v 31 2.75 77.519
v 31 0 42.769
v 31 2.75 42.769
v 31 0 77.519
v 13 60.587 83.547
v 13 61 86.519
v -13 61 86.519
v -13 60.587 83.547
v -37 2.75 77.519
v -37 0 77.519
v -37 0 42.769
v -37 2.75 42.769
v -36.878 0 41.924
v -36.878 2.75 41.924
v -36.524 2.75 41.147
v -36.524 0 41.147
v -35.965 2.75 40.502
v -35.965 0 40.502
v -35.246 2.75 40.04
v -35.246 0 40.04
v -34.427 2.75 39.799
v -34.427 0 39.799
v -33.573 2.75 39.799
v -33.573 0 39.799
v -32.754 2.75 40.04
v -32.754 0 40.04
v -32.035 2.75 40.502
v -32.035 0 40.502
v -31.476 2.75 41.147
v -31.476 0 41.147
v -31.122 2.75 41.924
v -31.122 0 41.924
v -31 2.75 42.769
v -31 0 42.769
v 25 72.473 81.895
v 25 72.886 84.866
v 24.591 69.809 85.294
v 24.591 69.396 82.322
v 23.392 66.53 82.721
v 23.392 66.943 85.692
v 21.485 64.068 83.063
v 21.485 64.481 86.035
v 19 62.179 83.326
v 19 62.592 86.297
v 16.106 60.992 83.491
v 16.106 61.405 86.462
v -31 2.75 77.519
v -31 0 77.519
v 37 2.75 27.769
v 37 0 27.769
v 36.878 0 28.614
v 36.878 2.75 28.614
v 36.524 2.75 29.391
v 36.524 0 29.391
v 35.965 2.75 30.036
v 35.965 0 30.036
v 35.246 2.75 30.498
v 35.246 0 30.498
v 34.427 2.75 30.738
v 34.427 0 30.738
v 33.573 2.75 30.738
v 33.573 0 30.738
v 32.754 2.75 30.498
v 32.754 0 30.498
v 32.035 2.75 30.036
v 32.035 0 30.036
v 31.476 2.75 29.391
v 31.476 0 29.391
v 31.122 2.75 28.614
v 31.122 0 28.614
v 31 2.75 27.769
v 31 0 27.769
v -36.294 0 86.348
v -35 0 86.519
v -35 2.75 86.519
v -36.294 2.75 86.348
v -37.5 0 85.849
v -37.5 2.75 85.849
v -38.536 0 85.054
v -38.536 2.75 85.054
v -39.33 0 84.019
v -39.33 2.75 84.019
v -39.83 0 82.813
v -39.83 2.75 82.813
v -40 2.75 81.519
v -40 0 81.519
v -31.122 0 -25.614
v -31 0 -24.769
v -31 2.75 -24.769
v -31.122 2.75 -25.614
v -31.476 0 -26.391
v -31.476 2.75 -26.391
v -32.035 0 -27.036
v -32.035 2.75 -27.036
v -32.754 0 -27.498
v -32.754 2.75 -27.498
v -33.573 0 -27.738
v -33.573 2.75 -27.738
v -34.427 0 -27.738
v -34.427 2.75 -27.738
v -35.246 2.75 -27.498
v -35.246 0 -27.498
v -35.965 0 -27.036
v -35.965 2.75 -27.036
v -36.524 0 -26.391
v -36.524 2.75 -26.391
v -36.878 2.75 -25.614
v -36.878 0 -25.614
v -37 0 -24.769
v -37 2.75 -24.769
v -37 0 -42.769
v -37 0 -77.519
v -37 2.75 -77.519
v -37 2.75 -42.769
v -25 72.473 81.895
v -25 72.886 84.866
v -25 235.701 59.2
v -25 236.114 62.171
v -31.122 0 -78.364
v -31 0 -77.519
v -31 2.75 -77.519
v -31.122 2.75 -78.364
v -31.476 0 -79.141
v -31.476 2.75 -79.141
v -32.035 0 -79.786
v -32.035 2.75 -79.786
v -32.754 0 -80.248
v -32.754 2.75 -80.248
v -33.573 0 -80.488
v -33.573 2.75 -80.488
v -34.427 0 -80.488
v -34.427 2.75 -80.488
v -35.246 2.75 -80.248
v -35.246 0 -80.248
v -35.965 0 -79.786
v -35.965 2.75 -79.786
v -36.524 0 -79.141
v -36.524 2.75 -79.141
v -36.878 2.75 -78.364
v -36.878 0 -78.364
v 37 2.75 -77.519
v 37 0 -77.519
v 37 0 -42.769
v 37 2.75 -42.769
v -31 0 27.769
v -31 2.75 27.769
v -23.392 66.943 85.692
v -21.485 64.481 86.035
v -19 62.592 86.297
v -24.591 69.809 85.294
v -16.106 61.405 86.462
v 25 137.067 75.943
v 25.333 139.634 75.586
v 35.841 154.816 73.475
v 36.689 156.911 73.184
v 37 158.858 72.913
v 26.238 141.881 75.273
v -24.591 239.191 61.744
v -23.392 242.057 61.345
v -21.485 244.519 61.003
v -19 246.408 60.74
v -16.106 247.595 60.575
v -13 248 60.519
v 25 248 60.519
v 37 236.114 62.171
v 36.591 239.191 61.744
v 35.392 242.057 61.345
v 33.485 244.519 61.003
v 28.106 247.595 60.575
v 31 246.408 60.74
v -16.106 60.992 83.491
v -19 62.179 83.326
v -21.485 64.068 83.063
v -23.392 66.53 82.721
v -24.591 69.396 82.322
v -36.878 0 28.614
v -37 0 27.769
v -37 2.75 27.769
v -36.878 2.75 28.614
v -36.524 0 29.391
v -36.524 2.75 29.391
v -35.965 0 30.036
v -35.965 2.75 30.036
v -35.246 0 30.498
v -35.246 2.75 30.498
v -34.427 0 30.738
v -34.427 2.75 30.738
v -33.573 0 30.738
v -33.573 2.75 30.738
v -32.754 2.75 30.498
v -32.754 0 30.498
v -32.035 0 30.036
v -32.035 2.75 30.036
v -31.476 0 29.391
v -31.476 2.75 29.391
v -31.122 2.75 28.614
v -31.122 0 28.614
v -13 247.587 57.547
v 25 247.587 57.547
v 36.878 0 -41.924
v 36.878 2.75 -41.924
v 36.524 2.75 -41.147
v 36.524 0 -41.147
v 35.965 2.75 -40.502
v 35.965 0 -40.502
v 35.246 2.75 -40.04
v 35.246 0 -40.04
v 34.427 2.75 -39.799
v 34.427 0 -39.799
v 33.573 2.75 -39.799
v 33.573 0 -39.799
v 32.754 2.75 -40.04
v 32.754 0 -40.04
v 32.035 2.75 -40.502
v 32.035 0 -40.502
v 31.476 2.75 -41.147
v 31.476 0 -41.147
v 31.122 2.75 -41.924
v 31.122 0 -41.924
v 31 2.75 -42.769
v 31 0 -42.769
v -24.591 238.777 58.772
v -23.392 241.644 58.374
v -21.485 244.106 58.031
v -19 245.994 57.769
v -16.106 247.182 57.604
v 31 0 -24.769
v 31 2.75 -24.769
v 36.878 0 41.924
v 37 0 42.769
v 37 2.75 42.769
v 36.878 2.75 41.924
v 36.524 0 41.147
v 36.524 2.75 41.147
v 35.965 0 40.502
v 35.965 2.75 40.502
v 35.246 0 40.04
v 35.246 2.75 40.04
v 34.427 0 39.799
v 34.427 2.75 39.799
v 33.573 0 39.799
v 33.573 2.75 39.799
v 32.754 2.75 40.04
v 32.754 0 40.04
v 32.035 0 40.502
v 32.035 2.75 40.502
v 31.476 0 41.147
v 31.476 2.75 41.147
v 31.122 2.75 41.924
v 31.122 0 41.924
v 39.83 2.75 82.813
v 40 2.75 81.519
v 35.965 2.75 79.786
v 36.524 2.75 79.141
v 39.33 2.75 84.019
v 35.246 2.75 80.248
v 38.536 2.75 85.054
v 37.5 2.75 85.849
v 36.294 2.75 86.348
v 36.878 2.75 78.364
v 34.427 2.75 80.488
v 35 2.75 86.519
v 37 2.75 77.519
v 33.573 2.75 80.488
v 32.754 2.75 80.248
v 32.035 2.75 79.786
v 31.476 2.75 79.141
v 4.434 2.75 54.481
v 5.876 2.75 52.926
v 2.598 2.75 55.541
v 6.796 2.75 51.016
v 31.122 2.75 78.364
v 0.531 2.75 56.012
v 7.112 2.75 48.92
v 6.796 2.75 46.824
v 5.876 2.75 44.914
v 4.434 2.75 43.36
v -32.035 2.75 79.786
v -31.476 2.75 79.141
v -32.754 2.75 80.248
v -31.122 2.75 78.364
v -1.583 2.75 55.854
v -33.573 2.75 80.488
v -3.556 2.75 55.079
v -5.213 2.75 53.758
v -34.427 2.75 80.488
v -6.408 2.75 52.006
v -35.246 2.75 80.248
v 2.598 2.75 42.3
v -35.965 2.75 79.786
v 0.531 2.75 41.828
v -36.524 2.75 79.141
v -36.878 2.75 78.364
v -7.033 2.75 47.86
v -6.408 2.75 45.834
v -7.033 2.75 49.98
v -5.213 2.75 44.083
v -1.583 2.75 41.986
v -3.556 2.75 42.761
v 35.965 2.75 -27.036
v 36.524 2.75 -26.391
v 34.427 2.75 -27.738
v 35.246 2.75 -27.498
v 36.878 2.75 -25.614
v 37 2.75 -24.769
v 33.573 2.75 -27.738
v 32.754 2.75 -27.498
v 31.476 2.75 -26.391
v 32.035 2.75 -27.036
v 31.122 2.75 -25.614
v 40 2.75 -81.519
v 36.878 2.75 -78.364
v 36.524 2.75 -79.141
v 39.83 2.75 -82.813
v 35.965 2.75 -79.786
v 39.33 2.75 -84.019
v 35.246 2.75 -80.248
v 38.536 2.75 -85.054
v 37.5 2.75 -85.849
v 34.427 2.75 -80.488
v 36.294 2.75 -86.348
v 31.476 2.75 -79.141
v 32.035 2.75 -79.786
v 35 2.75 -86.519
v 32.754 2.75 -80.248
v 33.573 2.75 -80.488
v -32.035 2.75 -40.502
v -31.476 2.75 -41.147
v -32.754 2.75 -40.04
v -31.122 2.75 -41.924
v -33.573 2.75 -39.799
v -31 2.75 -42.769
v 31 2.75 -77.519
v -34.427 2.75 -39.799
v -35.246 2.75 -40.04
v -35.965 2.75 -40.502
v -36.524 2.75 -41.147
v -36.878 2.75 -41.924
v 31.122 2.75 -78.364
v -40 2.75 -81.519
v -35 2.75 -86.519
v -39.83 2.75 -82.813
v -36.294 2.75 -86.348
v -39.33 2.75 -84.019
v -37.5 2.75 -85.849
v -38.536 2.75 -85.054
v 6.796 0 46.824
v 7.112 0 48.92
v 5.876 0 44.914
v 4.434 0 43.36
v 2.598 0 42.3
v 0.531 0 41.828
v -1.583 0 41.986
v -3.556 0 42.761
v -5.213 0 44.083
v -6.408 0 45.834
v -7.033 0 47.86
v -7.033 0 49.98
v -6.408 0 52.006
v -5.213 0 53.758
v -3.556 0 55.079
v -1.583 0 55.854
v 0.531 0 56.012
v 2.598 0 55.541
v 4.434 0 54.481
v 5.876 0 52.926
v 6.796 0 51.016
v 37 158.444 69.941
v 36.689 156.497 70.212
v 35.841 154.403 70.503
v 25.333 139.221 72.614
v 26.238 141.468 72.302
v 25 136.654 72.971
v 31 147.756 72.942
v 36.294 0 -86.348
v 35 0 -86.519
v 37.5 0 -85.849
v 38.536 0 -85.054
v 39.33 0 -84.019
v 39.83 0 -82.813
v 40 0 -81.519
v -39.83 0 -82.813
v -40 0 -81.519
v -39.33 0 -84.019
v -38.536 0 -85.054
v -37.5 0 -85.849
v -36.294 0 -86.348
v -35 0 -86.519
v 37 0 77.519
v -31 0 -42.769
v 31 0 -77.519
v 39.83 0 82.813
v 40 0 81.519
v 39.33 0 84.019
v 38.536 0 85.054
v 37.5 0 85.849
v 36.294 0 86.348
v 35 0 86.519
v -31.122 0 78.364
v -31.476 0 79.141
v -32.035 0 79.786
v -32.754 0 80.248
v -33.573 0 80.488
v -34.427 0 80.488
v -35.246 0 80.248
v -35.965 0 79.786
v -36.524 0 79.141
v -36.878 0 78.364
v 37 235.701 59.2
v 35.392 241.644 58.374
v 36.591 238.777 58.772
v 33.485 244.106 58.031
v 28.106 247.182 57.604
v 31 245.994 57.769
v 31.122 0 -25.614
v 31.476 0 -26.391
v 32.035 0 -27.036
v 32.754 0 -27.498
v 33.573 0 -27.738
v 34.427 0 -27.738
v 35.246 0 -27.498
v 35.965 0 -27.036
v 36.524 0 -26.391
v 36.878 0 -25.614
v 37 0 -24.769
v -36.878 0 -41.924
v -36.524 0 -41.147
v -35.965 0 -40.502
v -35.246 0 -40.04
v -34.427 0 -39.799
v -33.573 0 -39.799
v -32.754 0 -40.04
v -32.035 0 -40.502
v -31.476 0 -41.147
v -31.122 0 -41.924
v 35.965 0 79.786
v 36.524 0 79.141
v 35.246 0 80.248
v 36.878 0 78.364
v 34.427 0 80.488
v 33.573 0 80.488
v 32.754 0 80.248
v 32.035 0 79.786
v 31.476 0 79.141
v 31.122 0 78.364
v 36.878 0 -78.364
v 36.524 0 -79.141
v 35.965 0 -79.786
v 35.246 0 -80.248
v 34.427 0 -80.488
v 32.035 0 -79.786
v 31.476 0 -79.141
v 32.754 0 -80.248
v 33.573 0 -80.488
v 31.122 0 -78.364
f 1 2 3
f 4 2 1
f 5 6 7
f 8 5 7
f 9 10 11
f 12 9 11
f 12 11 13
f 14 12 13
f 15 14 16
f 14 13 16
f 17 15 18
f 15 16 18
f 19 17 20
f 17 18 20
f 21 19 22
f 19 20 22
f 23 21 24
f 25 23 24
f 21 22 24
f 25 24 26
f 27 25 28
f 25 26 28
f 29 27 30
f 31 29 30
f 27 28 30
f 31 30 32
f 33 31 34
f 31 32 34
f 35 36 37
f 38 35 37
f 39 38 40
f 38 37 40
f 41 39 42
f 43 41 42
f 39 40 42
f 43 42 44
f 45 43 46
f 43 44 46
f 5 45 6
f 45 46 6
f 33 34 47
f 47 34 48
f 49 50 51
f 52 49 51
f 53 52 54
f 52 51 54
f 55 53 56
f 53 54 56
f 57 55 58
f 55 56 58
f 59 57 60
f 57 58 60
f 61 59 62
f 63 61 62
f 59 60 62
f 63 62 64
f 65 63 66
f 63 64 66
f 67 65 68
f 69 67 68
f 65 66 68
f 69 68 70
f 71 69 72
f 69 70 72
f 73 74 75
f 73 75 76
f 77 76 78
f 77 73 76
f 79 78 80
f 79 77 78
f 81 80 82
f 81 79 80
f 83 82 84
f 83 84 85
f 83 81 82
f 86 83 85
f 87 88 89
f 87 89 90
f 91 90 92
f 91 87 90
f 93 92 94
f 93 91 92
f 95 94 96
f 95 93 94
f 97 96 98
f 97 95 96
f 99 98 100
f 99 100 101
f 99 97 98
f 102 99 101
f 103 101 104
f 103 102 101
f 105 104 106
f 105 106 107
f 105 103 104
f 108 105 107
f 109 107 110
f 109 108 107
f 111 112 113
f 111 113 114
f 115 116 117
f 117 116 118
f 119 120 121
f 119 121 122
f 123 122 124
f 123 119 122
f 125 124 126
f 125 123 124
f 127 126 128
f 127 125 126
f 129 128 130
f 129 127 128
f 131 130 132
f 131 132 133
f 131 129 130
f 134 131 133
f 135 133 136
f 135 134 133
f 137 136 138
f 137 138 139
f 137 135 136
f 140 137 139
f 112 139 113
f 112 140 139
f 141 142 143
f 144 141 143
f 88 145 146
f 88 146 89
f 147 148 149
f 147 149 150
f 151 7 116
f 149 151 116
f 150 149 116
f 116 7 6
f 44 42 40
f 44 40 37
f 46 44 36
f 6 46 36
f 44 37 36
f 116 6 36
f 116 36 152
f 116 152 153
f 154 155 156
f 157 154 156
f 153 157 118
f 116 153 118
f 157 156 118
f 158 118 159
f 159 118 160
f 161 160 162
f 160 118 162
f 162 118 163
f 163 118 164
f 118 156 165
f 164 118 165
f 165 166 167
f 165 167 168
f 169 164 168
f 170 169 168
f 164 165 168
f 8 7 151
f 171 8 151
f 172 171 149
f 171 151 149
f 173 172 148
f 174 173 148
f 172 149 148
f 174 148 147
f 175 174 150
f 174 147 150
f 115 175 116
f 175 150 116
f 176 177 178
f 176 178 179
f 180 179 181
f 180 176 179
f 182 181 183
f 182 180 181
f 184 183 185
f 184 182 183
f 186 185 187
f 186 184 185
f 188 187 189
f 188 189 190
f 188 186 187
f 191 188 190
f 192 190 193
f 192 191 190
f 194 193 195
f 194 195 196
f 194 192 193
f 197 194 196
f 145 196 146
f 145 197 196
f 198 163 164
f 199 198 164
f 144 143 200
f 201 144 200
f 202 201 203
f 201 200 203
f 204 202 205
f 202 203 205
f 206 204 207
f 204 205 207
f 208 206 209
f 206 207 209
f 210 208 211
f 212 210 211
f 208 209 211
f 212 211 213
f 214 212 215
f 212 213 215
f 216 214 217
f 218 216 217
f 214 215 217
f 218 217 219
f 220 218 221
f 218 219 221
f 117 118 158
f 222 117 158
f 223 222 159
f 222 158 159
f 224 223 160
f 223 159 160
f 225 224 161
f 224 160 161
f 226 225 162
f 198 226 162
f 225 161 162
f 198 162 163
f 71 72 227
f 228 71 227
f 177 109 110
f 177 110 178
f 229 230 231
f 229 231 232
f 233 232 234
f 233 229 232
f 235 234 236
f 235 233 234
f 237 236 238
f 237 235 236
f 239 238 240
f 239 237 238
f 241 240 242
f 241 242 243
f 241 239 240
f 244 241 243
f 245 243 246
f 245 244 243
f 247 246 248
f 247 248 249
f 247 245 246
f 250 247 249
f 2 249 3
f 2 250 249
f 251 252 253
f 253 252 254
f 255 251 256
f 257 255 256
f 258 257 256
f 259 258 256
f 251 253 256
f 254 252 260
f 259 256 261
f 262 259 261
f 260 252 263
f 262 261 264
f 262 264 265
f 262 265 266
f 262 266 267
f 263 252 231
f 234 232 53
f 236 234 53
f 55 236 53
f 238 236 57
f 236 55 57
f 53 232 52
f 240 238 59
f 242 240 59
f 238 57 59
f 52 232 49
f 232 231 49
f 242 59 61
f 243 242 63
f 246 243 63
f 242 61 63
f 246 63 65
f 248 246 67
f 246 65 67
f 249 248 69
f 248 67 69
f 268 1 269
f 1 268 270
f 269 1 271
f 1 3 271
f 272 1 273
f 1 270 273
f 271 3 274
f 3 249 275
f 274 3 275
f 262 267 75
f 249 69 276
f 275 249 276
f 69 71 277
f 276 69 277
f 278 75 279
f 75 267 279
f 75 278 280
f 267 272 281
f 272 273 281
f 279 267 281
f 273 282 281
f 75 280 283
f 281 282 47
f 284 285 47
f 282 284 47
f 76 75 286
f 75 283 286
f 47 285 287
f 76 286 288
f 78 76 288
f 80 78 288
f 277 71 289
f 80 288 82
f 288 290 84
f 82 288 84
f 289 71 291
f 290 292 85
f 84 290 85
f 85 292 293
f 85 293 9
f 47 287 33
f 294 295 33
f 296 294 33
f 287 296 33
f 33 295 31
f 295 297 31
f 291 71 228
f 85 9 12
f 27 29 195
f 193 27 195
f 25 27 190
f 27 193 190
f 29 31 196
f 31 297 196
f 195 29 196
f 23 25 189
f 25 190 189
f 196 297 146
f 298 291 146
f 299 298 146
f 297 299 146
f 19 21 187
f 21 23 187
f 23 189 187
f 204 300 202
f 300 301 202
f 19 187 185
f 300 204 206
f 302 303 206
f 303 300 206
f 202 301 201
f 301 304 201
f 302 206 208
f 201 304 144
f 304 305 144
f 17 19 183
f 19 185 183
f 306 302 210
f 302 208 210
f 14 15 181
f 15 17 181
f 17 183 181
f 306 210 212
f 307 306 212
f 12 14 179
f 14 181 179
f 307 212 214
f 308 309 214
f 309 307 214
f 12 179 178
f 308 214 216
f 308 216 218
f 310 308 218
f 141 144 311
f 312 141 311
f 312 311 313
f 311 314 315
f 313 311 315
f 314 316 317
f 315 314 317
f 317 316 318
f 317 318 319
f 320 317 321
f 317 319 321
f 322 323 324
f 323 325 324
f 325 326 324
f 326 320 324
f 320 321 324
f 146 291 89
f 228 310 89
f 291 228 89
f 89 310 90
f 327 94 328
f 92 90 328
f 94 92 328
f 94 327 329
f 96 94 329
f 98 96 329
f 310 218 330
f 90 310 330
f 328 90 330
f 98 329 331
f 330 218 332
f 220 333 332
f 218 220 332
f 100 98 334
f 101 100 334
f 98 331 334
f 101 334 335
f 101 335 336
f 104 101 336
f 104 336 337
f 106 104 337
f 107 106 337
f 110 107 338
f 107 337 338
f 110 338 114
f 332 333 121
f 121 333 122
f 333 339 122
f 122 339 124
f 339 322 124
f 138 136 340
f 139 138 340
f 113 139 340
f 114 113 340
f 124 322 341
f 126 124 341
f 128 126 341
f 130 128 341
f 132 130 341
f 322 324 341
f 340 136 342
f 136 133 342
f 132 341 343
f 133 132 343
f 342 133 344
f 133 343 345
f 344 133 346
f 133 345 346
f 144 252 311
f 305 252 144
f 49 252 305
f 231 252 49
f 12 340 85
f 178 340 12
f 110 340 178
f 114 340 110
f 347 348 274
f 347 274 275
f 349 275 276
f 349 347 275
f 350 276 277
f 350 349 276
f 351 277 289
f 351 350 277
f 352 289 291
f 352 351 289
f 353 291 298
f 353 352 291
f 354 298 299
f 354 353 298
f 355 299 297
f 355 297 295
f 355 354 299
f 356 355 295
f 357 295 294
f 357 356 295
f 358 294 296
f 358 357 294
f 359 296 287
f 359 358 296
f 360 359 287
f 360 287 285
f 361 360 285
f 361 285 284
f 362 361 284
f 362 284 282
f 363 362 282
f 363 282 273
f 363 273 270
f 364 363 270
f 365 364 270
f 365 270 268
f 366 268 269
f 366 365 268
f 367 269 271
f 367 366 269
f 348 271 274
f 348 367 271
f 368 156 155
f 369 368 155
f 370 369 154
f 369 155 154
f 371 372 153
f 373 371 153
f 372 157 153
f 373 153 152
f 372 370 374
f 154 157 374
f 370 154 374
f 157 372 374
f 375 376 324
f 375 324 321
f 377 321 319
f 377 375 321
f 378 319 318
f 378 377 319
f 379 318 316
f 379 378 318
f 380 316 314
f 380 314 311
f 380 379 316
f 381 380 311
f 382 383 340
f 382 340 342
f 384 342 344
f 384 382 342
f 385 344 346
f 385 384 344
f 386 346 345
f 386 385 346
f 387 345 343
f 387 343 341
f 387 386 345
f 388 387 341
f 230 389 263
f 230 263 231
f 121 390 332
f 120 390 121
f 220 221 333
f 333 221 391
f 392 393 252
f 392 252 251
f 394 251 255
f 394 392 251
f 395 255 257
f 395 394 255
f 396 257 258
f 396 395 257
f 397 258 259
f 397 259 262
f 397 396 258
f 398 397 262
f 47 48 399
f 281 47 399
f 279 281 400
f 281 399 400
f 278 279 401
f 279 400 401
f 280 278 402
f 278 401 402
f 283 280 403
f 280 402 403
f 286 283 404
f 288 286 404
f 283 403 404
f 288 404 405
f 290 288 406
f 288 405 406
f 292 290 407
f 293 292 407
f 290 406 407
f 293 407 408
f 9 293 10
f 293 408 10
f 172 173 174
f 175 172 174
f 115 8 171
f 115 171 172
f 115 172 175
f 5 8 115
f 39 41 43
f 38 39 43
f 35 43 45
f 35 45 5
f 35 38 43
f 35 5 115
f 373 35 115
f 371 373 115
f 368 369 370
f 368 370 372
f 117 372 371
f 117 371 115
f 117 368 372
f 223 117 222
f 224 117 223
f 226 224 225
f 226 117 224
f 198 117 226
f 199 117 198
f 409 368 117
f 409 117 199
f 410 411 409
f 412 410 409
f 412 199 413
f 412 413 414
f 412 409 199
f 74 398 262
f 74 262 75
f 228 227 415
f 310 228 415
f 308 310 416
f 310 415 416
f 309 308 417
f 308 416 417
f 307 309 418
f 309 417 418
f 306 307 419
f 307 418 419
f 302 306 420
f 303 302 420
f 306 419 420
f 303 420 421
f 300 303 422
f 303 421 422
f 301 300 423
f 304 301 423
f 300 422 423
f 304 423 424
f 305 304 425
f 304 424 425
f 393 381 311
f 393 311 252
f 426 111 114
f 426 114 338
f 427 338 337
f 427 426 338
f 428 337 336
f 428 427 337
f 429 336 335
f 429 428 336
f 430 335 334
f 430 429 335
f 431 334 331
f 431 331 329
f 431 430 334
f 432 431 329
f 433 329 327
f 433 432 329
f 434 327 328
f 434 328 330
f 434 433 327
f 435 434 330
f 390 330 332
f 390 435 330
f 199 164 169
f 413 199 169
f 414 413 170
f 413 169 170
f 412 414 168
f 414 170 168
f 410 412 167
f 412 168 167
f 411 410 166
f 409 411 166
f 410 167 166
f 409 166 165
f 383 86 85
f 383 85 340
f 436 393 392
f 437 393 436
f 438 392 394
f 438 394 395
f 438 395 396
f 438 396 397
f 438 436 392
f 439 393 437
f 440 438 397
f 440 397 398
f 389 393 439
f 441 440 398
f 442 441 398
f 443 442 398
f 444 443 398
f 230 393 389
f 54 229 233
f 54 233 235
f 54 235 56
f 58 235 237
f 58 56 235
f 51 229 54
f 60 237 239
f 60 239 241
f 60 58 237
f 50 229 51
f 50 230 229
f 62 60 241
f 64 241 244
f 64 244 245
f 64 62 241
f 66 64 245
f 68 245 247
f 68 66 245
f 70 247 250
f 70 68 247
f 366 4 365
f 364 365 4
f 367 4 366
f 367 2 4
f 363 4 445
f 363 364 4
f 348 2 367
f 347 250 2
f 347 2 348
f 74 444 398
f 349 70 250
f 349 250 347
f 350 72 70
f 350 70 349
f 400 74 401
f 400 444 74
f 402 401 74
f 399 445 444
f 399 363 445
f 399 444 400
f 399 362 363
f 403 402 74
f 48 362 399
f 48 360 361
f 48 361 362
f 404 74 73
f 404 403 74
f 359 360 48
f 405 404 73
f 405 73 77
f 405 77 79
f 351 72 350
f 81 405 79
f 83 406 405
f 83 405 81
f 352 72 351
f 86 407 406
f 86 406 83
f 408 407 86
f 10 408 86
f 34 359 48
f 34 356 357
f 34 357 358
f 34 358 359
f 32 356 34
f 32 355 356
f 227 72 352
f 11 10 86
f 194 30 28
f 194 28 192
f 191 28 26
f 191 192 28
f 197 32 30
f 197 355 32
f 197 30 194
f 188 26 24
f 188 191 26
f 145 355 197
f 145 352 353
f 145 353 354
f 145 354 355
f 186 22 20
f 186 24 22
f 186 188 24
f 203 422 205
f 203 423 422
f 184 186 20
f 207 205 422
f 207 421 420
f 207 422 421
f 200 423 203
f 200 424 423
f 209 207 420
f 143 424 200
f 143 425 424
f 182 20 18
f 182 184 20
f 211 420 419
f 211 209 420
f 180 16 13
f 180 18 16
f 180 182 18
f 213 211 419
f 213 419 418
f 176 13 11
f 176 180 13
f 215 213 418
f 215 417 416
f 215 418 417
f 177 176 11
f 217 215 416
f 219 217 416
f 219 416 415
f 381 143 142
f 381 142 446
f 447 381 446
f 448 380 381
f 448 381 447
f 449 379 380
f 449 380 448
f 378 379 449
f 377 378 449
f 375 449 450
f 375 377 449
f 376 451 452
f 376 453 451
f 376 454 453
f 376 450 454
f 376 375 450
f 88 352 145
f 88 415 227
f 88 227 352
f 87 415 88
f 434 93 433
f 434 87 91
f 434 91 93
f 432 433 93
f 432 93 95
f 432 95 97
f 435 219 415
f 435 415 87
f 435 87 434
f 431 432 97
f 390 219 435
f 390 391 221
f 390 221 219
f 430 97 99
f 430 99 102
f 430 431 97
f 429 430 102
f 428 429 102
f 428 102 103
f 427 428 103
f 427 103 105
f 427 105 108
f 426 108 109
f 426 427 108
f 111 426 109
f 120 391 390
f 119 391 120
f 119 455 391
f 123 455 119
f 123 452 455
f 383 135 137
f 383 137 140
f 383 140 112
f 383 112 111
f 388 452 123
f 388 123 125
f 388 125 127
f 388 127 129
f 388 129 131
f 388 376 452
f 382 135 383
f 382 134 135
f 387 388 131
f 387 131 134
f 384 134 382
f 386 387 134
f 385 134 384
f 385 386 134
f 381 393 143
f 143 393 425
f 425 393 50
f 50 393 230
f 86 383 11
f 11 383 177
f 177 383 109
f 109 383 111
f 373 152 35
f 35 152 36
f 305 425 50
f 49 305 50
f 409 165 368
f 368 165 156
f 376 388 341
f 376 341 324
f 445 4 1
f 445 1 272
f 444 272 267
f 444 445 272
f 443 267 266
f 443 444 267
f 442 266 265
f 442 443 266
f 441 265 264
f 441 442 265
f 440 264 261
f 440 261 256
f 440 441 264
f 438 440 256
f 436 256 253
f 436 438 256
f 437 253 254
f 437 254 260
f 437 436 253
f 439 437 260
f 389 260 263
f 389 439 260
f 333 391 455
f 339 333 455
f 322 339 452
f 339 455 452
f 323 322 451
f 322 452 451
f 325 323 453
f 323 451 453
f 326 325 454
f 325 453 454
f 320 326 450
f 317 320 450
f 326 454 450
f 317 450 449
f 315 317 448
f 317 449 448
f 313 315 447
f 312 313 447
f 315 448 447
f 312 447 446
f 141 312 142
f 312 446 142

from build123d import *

# Parameters (mm, degrees)
SKETCH1_R           = 7.112045721
BOSS_EXTRUDE1_DEPTH = 2.75
BOSS_EXTRUDE2_DEPTH = 3


with BuildPart() as part:
    # Sketch1 → Boss-Extrude1 (new body)
    with BuildSketch(Plane(origin=(0, 0, 0), x_dir=(1, 0, 0), z_dir=(0, 1, 0))):
        with BuildLine():
            Line((-35, 86.51875), (35, 86.51875))
            ThreePointArc((35, 86.51875), (38.535533906, 85.054283906), (40, 81.51875))
            Line((40, 81.51875), (40, -81.51875))
            ThreePointArc((40, -81.51875), (38.535533906, -85.054283906), (35, -86.51875))
            Line((35, -86.51875), (-35, -86.51875))
            ThreePointArc((-35, -86.51875), (-38.535533906, -85.054283906), (-40, -81.51875))
            Line((-40, -81.51875), (-40, 81.51875))
            ThreePointArc((-40, 81.51875), (-38.535533906, 85.054283906), (-35, 86.51875))
        make_face()
        with Locations((0, -48.920084539)):
            Circle(SKETCH1_R, mode=Mode.SUBTRACT)
        with BuildLine():
            Line((37, 77.51875), (37, 42.76875))
            ThreePointArc((37, 42.76875), (34, 39.76875), (31, 42.76875))
            Line((31, 42.76875), (31, 77.51875))
            ThreePointArc((31, 77.51875), (34, 80.51875), (37, 77.51875))
        make_face(mode=Mode.SUBTRACT)
        with BuildLine():
            Line((-37, 77.51875), (-37, 42.76875))
            ThreePointArc((-37, 42.76875), (-34, 39.76875), (-31, 42.76875))
            Line((-31, 42.76875), (-31, 77.51875))
            ThreePointArc((-31, 77.51875), (-34, 80.51875), (-37, 77.51875))
        make_face(mode=Mode.SUBTRACT)
        with BuildLine():
            Line((37, -77.51875), (37, -42.76875))
            ThreePointArc((37, -42.76875), (34, -39.76875), (31, -42.76875))
            Line((31, -42.76875), (31, -77.51875))
            ThreePointArc((31, -77.51875), (34, -80.51875), (37, -77.51875))
        make_face(mode=Mode.SUBTRACT)
        with BuildLine():
            Line((-37, -77.51875), (-37, -42.76875))
            ThreePointArc((-37, -42.76875), (-34, -39.76875), (-31, -42.76875))
            Line((-31, -42.76875), (-31, -77.51875))
            ThreePointArc((-31, -77.51875), (-34, -80.51875), (-37, -77.51875))
        make_face(mode=Mode.SUBTRACT)
        with BuildLine():
            Line((37, 24.76875), (37, -27.76875))
            ThreePointArc((37, -27.76875), (34, -30.76875), (31, -27.76875))
            Line((31, -27.76875), (31, 24.76875))
            ThreePointArc((31, 24.76875), (34, 27.76875), (37, 24.76875))
        make_face(mode=Mode.SUBTRACT)
        with BuildLine():
            Line((-37, 24.76875), (-37, -27.76875))
            ThreePointArc((-37, -27.76875), (-34, -30.76875), (-31, -27.76875))
            Line((-31, -27.76875), (-31, 24.76875))
            ThreePointArc((-31, 24.76875), (-34, 27.76875), (-37, 24.76875))
        make_face(mode=Mode.SUBTRACT)
    extrude(amount=BOSS_EXTRUDE1_DEPTH)


with BuildPart() as body_2:
    # Sketch3 → Boss-Extrude2 (new body)
    with BuildSketch(Plane(origin=(0, 12.958063193, 93.198377578), x_dir=(0, -0.990472215, 0.137712714), z_dir=(0, 0.137712714, 0.990472215))):
        with BuildLine():
            Line((-125.30290794, 25), (-60.504073198, 25))
            ThreePointArc((-60.504073198, 25), (-52.018791824, 21.485281374), (-48.504073198, 13))
            Line((-48.504073198, 13), (-48.504073198, -13))
            ThreePointArc((-48.504073198, -13), (-52.018791824, -21.485281374), (-60.504073198, -25))
            Line((-60.504073198, -25), (-225.30290794, -25))
            ThreePointArc((-225.30290794, -25), (-233.788189314, -21.485281374), (-237.30290794, -13))
            Line((-237.30290794, -13), (-237.30290794, 25))
            ThreePointArc((-237.30290794, 25), (-233.788189314, 33.485281374), (-225.30290794, 37))
            Line((-225.30290794, 37), (-147.30290794, 37))
            add(Edge.make_bspline(
                [(-147.30290794, 37), (-144.065512893, 37), (-135.5827842, 31), (-129.980550468, 25), (-125.30290794, 25)],
                knots=[0, 0, 0, 0, 0.5, 1, 1, 1, 1], degree=3))
        make_face()
    extrude(amount=-BOSS_EXTRUDE2_DEPTH)


solid = Compound([part.part, body_2.part])
